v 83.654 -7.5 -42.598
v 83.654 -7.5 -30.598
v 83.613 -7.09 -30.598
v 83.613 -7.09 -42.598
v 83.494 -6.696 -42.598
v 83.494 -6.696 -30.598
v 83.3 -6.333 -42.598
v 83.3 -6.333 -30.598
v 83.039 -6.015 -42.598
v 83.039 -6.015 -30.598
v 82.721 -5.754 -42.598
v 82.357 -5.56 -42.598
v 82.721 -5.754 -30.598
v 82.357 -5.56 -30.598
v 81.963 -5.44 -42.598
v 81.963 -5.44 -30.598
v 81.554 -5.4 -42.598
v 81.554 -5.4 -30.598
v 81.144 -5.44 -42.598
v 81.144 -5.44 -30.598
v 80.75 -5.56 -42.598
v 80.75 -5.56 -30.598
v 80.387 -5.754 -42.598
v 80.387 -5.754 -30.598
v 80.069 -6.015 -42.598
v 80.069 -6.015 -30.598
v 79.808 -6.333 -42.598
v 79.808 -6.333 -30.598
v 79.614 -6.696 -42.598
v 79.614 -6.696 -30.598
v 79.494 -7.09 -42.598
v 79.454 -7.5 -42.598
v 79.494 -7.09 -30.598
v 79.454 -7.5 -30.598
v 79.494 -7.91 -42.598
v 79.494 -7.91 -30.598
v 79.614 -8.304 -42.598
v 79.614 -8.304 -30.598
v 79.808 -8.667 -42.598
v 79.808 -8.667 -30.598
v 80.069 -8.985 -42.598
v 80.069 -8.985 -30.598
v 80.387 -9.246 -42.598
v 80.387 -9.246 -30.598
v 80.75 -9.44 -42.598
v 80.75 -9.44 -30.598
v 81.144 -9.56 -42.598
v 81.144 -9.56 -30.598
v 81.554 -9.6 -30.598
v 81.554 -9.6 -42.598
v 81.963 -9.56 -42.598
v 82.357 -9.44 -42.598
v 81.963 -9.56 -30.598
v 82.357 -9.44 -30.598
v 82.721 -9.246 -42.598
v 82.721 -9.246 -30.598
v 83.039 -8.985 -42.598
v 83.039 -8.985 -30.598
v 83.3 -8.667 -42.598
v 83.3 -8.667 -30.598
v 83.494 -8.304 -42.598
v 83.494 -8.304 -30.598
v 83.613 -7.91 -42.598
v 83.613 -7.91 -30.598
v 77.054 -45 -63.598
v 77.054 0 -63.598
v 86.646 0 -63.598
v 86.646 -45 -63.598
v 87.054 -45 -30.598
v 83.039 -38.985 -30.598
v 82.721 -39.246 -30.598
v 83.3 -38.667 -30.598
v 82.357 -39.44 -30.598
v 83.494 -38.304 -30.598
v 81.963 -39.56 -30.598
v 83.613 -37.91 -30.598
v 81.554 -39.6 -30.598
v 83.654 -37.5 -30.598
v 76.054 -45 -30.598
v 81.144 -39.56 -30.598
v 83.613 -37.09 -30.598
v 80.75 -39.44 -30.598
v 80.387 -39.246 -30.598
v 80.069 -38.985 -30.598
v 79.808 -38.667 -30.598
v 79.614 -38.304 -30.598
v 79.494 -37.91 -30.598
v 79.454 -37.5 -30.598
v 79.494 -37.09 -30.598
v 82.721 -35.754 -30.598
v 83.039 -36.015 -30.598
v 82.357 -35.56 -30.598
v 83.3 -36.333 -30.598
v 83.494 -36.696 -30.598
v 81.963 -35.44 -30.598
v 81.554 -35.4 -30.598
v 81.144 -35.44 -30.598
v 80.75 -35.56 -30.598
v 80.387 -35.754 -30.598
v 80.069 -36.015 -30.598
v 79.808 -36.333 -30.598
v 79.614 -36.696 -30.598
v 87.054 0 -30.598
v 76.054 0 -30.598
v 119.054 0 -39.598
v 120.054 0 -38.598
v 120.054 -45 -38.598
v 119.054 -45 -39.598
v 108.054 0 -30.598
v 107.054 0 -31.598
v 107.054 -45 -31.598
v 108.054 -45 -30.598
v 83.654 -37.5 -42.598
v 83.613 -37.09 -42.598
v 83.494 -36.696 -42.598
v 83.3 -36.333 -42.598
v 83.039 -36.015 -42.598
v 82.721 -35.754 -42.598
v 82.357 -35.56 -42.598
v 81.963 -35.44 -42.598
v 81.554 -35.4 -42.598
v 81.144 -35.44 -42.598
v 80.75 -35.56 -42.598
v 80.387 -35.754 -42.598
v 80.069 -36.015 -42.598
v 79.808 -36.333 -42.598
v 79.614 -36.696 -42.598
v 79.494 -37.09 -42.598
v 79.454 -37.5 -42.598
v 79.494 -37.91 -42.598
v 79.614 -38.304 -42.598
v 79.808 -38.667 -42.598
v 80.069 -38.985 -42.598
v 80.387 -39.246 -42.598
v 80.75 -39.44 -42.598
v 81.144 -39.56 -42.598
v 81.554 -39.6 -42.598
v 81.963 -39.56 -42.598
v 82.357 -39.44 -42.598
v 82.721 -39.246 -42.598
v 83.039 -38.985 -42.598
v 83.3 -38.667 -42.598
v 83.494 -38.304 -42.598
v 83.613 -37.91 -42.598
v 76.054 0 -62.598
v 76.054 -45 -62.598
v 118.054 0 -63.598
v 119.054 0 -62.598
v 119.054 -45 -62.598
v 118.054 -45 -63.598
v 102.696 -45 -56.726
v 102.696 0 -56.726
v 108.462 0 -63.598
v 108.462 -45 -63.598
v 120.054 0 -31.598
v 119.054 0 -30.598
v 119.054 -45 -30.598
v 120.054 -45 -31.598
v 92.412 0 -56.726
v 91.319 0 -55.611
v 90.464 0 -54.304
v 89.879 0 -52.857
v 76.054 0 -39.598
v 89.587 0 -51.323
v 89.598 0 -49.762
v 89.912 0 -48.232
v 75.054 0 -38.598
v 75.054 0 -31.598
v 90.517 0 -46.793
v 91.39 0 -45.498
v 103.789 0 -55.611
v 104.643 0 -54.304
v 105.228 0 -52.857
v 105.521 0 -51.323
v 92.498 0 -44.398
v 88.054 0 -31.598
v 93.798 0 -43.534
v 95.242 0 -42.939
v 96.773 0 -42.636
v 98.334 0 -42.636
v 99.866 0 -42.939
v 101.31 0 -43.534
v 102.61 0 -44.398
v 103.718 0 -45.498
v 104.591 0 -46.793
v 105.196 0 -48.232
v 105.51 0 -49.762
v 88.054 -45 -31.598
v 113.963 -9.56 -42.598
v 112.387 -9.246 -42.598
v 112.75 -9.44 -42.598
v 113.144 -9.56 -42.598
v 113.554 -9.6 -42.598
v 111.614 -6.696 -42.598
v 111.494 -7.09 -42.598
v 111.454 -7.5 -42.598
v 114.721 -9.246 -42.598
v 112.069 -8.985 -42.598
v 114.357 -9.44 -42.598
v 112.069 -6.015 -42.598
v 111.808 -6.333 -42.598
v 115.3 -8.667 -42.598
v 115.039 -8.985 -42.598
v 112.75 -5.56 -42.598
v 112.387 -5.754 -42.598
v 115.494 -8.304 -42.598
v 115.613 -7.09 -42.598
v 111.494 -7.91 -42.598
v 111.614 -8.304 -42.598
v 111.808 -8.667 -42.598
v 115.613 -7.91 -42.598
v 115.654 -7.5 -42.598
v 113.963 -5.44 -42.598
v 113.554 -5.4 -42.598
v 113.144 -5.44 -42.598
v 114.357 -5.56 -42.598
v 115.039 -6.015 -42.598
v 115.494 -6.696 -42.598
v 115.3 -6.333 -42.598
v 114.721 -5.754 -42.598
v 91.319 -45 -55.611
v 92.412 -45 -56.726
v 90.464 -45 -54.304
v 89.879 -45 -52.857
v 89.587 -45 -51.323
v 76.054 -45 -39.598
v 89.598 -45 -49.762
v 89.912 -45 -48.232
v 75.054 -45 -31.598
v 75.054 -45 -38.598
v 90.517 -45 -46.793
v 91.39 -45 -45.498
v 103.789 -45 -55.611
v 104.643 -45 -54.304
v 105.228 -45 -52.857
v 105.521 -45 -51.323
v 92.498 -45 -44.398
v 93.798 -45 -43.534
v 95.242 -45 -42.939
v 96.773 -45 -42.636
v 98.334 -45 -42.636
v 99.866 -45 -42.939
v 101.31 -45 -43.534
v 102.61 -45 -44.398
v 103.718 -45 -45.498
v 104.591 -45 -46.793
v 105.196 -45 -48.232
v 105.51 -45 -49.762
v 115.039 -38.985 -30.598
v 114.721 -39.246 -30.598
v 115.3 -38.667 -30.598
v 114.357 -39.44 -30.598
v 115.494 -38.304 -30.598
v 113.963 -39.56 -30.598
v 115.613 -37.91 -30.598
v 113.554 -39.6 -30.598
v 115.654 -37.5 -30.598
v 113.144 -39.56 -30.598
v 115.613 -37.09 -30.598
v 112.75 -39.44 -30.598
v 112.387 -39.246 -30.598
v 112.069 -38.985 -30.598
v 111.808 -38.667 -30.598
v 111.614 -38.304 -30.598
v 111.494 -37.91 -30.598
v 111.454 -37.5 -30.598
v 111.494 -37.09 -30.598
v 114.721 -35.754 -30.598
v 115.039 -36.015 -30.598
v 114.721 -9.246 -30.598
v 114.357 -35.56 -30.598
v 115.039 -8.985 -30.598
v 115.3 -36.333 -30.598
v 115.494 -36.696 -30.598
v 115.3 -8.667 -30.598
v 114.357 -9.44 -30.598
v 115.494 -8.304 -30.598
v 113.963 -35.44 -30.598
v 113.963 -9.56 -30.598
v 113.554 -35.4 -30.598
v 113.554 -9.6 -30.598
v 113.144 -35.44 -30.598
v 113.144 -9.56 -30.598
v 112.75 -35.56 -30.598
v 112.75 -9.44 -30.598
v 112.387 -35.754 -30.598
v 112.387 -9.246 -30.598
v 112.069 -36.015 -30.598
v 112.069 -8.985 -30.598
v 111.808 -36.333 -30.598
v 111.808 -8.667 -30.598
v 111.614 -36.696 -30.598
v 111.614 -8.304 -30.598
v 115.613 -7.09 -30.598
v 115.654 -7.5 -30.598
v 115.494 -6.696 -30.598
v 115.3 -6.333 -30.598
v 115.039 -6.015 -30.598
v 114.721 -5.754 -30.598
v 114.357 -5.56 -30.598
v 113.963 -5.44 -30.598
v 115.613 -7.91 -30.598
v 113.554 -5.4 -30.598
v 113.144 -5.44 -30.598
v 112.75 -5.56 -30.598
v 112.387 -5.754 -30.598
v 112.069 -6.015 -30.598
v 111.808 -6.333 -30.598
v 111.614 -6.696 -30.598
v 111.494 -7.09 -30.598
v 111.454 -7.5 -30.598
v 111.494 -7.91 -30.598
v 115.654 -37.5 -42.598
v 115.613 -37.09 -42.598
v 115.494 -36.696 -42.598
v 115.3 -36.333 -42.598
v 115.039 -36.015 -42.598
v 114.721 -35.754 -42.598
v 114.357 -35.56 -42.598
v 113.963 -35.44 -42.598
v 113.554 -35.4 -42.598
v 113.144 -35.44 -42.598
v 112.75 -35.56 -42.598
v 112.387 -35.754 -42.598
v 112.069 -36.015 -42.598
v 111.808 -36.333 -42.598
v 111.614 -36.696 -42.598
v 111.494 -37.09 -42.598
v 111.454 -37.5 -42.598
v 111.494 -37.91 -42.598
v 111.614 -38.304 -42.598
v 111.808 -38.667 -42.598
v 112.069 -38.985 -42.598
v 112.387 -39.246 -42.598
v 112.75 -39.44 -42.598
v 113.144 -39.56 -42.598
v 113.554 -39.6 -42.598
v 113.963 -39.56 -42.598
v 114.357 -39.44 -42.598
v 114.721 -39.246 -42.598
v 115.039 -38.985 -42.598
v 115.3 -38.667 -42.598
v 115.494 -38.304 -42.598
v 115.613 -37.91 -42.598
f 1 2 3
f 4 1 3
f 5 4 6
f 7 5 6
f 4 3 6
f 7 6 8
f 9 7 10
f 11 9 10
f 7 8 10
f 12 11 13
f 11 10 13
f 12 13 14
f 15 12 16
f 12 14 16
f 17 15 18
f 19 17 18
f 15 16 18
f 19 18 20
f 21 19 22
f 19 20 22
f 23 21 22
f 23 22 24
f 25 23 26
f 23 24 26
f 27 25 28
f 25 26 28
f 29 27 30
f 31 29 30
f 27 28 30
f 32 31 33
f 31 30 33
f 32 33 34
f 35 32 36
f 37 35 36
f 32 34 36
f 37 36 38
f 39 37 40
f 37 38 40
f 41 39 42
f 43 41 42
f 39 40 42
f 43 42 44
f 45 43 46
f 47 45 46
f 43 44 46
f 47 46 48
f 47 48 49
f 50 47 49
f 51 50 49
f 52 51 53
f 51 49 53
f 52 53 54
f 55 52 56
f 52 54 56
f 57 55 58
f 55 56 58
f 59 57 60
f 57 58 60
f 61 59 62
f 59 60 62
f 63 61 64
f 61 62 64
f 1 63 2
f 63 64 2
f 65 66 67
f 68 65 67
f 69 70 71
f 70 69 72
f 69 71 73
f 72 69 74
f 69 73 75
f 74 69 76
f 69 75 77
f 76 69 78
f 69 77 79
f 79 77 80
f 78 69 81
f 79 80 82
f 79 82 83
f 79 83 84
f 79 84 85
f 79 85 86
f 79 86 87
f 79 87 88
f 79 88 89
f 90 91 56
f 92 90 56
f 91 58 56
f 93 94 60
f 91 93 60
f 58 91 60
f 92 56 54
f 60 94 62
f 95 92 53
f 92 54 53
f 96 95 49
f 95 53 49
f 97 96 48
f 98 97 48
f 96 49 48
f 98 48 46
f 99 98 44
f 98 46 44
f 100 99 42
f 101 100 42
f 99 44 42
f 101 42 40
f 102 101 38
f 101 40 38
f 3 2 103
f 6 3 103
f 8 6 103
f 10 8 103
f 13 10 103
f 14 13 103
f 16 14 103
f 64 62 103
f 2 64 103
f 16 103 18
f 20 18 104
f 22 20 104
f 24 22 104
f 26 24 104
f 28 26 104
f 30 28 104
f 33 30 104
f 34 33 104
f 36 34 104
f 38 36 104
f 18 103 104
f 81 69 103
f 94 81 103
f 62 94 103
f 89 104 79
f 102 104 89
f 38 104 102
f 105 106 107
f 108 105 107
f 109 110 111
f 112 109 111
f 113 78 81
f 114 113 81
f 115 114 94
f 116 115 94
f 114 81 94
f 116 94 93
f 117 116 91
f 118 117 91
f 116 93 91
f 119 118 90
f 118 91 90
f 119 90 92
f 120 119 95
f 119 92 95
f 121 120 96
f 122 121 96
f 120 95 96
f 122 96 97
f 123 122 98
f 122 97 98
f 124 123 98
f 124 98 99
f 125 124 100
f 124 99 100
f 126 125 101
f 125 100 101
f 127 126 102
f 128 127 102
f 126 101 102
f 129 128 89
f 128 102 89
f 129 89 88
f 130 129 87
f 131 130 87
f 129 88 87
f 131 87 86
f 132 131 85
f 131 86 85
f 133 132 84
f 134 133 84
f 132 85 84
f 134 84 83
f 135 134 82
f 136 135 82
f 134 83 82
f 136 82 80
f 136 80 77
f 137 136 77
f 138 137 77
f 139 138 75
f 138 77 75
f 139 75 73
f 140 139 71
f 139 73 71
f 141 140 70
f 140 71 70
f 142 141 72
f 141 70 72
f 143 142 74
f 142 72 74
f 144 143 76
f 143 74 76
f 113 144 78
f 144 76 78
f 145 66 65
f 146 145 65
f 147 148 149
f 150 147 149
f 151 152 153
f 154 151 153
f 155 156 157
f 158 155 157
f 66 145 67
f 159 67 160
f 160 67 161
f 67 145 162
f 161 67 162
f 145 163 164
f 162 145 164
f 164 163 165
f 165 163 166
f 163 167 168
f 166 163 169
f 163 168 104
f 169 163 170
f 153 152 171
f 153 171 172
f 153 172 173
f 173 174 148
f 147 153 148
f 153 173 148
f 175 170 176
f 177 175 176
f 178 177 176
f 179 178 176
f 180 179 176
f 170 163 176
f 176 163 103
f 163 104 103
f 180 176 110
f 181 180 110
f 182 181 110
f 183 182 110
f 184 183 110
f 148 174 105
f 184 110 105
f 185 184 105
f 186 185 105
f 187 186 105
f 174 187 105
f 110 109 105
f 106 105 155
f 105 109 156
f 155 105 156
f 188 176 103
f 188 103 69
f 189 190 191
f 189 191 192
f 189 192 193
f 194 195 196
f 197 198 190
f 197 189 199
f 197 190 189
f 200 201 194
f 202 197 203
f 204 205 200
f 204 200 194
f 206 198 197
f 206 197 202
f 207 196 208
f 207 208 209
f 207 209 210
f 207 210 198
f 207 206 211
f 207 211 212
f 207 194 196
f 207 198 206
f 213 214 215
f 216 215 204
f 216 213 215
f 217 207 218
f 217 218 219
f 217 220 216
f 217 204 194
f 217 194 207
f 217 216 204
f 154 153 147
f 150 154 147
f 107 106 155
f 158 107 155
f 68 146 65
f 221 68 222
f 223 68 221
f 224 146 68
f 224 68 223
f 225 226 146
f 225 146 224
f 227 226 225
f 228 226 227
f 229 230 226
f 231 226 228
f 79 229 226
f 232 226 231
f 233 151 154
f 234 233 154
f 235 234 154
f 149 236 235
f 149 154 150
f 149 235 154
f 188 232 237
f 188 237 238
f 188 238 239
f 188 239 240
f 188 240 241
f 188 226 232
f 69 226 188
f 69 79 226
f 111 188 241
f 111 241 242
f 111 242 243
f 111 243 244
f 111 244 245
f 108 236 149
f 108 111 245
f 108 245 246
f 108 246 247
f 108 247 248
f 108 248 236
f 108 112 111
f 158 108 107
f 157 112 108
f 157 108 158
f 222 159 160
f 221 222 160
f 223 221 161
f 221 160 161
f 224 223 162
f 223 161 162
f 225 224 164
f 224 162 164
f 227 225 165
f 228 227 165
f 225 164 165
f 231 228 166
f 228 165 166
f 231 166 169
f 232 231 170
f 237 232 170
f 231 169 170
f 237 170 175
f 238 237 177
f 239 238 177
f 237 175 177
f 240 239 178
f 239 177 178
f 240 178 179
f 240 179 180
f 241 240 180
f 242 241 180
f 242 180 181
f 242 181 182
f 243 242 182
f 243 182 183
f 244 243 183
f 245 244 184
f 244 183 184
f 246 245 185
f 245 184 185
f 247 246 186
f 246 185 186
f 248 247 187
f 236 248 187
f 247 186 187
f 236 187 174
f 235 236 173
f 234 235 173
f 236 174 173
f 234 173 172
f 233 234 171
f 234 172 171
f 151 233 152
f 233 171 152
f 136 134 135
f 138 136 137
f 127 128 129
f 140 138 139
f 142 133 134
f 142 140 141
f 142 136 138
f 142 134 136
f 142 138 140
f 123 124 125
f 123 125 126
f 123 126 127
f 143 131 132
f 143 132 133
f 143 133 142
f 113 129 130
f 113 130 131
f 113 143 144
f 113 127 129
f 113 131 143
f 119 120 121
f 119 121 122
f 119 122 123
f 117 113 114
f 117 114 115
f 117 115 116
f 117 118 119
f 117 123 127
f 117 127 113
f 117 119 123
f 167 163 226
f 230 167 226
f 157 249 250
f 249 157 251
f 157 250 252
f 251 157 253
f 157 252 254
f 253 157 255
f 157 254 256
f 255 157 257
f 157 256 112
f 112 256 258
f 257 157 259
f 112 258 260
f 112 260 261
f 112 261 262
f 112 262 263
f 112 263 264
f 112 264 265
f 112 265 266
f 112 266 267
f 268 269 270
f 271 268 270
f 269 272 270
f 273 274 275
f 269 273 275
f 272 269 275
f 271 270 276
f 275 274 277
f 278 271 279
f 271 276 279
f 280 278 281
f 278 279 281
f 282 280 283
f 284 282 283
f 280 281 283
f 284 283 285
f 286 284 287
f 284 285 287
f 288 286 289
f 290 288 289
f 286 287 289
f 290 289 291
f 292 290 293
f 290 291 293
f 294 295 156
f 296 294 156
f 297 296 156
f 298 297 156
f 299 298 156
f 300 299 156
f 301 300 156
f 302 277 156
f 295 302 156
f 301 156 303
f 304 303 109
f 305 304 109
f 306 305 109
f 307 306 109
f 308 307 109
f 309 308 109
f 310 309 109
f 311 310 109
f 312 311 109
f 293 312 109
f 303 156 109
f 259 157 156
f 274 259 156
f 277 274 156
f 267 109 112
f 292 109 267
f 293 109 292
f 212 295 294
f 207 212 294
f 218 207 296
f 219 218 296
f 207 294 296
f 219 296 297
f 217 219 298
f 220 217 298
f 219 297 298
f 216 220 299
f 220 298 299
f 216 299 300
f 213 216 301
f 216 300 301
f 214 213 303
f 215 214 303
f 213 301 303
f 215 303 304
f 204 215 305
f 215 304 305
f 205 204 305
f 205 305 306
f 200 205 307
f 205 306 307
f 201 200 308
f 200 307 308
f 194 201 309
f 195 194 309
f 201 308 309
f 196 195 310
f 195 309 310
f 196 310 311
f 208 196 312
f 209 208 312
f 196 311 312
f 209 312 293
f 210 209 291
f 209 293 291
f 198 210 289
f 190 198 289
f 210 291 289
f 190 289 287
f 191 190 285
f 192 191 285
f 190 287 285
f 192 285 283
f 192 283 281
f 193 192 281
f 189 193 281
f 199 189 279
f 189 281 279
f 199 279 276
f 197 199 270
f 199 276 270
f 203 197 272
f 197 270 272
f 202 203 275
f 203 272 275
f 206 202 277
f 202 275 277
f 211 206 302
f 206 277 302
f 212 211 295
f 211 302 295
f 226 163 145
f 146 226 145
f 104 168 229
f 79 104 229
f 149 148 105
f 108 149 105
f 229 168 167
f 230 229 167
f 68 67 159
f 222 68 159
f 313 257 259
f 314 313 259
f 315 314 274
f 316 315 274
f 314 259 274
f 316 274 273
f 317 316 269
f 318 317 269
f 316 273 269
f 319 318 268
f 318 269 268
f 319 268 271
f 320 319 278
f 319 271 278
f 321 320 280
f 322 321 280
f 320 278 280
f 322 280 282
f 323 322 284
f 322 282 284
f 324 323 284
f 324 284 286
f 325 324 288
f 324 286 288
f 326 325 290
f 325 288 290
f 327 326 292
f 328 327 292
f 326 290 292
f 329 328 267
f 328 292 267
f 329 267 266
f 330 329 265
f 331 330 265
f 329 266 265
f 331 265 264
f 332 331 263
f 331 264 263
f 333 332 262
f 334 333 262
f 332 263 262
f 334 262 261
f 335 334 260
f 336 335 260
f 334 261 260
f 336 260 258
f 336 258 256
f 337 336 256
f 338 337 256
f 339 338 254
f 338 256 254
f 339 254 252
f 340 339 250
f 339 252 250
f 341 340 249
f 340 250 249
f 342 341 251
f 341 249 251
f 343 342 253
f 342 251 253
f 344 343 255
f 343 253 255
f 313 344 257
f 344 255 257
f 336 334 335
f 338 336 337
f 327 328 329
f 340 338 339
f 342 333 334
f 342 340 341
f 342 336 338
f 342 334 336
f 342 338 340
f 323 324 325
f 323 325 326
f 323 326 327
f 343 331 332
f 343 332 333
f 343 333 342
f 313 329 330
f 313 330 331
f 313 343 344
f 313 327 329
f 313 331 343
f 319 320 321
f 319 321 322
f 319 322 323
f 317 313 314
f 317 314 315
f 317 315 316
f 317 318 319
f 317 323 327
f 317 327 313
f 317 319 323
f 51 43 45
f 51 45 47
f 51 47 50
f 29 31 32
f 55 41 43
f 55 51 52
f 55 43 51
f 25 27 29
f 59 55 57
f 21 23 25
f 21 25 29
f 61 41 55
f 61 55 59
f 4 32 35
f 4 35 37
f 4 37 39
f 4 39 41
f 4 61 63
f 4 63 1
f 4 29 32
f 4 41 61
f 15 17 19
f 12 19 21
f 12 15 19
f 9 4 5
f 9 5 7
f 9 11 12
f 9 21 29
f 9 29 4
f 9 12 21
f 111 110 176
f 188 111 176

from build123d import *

# Parameters (mm, degrees)
F1_DEPTH = 45
F2_R     = 2.1
F3_DEPTH = 12
F4_SIZE  = 0.99999


# Not quite as in the source:
# - a fillet or chamfer is up to 0.001 mm smaller than in the source, because OpenCascade refuses the exact size


with BuildPart() as f1:
    # F0 (on Front) → F1 (new body)
    with BuildSketch(Plane.XZ):
        with BuildLine():
            Line((88.0538091608, -30.5978502929), (75.0538091608, -30.5978502929))
            Line((75.0538091608, -30.5978502929), (75.0538091608, -39.5978502929))
            Line((75.0538091608, -39.5978502929), (76.0538091608, -39.5978502929))
            Line((76.0538091608, -39.5978502929), (76.0538091608, -63.5978502929))
            Line((76.0538091608, -63.5978502929), (86.6455139554, -63.5978502929))
            Line((86.6455139554, -63.5978502929), (92.4115082833, -56.7262058379))
            ThreePointArc((92.4115082833, -56.7262058379), (97.5538091608, -42.5978502929), (102.6961100382, -56.7262058379))
            Line((102.6961100382, -56.7262058379), (108.4621043661, -63.5978502929))
            Line((108.4621043661, -63.5978502929), (119.0538091608, -63.5978502929))
            Line((119.0538091608, -63.5978502929), (119.0538091608, -39.5978502929))
            Line((119.0538091608, -39.5978502929), (120.0538091608, -39.5978502929))
            Line((120.0538091608, -39.5978502929), (120.0538091608, -30.5978502929))
            Line((120.0538091608, -30.5978502929), (107.0538091608, -30.5978502929))
            Line((107.0538091608, -30.5978502929), (107.0538091608, -31.5978502929))
            Line((107.0538091608, -31.5978502929), (88.0538091608, -31.5978502929))
            Line((88.0538091608, -31.5978502929), (88.0538091608, -30.5978502929))
        make_face()
    extrude(amount=F1_DEPTH)

    # F2 (on face) → F3 (cut)
    with BuildSketch(Plane.XY.offset(-30.5978502929)):
        with Locations((81.5538091608, -7.5)):
            Circle(F2_R)
        with Locations((81.5538091608, -37.5)):
            Circle(F2_R)
        with Locations((113.5538091608, -7.5)):
            Circle(F2_R)
        with Locations((113.5538091608, -37.5)):
            Circle(F2_R)
    extrude(amount=-F3_DEPTH, mode=Mode.SUBTRACT)

    # F4 (size 1 in the source; OpenCascade refuses exactly that, so slightly less here)
    f4_edges = [f1.edges().sort_by_distance(p)[0] for p in [
        (88.053809, -22.5, -30.59785),
        (107.053809, -22.5, -30.59785),
        (75.053809, -22.5, -30.59785),
        (75.053809, -22.5, -39.59785),
        (120.053809, -22.5, -30.59785),
        (120.053809, -22.5, -39.59785),
        (76.053809, -22.5, -63.59785),
        (119.053809, -22.5, -63.59785),
    ]]
    chamfer(f4_edges, length=F4_SIZE)


solid = f1.part
